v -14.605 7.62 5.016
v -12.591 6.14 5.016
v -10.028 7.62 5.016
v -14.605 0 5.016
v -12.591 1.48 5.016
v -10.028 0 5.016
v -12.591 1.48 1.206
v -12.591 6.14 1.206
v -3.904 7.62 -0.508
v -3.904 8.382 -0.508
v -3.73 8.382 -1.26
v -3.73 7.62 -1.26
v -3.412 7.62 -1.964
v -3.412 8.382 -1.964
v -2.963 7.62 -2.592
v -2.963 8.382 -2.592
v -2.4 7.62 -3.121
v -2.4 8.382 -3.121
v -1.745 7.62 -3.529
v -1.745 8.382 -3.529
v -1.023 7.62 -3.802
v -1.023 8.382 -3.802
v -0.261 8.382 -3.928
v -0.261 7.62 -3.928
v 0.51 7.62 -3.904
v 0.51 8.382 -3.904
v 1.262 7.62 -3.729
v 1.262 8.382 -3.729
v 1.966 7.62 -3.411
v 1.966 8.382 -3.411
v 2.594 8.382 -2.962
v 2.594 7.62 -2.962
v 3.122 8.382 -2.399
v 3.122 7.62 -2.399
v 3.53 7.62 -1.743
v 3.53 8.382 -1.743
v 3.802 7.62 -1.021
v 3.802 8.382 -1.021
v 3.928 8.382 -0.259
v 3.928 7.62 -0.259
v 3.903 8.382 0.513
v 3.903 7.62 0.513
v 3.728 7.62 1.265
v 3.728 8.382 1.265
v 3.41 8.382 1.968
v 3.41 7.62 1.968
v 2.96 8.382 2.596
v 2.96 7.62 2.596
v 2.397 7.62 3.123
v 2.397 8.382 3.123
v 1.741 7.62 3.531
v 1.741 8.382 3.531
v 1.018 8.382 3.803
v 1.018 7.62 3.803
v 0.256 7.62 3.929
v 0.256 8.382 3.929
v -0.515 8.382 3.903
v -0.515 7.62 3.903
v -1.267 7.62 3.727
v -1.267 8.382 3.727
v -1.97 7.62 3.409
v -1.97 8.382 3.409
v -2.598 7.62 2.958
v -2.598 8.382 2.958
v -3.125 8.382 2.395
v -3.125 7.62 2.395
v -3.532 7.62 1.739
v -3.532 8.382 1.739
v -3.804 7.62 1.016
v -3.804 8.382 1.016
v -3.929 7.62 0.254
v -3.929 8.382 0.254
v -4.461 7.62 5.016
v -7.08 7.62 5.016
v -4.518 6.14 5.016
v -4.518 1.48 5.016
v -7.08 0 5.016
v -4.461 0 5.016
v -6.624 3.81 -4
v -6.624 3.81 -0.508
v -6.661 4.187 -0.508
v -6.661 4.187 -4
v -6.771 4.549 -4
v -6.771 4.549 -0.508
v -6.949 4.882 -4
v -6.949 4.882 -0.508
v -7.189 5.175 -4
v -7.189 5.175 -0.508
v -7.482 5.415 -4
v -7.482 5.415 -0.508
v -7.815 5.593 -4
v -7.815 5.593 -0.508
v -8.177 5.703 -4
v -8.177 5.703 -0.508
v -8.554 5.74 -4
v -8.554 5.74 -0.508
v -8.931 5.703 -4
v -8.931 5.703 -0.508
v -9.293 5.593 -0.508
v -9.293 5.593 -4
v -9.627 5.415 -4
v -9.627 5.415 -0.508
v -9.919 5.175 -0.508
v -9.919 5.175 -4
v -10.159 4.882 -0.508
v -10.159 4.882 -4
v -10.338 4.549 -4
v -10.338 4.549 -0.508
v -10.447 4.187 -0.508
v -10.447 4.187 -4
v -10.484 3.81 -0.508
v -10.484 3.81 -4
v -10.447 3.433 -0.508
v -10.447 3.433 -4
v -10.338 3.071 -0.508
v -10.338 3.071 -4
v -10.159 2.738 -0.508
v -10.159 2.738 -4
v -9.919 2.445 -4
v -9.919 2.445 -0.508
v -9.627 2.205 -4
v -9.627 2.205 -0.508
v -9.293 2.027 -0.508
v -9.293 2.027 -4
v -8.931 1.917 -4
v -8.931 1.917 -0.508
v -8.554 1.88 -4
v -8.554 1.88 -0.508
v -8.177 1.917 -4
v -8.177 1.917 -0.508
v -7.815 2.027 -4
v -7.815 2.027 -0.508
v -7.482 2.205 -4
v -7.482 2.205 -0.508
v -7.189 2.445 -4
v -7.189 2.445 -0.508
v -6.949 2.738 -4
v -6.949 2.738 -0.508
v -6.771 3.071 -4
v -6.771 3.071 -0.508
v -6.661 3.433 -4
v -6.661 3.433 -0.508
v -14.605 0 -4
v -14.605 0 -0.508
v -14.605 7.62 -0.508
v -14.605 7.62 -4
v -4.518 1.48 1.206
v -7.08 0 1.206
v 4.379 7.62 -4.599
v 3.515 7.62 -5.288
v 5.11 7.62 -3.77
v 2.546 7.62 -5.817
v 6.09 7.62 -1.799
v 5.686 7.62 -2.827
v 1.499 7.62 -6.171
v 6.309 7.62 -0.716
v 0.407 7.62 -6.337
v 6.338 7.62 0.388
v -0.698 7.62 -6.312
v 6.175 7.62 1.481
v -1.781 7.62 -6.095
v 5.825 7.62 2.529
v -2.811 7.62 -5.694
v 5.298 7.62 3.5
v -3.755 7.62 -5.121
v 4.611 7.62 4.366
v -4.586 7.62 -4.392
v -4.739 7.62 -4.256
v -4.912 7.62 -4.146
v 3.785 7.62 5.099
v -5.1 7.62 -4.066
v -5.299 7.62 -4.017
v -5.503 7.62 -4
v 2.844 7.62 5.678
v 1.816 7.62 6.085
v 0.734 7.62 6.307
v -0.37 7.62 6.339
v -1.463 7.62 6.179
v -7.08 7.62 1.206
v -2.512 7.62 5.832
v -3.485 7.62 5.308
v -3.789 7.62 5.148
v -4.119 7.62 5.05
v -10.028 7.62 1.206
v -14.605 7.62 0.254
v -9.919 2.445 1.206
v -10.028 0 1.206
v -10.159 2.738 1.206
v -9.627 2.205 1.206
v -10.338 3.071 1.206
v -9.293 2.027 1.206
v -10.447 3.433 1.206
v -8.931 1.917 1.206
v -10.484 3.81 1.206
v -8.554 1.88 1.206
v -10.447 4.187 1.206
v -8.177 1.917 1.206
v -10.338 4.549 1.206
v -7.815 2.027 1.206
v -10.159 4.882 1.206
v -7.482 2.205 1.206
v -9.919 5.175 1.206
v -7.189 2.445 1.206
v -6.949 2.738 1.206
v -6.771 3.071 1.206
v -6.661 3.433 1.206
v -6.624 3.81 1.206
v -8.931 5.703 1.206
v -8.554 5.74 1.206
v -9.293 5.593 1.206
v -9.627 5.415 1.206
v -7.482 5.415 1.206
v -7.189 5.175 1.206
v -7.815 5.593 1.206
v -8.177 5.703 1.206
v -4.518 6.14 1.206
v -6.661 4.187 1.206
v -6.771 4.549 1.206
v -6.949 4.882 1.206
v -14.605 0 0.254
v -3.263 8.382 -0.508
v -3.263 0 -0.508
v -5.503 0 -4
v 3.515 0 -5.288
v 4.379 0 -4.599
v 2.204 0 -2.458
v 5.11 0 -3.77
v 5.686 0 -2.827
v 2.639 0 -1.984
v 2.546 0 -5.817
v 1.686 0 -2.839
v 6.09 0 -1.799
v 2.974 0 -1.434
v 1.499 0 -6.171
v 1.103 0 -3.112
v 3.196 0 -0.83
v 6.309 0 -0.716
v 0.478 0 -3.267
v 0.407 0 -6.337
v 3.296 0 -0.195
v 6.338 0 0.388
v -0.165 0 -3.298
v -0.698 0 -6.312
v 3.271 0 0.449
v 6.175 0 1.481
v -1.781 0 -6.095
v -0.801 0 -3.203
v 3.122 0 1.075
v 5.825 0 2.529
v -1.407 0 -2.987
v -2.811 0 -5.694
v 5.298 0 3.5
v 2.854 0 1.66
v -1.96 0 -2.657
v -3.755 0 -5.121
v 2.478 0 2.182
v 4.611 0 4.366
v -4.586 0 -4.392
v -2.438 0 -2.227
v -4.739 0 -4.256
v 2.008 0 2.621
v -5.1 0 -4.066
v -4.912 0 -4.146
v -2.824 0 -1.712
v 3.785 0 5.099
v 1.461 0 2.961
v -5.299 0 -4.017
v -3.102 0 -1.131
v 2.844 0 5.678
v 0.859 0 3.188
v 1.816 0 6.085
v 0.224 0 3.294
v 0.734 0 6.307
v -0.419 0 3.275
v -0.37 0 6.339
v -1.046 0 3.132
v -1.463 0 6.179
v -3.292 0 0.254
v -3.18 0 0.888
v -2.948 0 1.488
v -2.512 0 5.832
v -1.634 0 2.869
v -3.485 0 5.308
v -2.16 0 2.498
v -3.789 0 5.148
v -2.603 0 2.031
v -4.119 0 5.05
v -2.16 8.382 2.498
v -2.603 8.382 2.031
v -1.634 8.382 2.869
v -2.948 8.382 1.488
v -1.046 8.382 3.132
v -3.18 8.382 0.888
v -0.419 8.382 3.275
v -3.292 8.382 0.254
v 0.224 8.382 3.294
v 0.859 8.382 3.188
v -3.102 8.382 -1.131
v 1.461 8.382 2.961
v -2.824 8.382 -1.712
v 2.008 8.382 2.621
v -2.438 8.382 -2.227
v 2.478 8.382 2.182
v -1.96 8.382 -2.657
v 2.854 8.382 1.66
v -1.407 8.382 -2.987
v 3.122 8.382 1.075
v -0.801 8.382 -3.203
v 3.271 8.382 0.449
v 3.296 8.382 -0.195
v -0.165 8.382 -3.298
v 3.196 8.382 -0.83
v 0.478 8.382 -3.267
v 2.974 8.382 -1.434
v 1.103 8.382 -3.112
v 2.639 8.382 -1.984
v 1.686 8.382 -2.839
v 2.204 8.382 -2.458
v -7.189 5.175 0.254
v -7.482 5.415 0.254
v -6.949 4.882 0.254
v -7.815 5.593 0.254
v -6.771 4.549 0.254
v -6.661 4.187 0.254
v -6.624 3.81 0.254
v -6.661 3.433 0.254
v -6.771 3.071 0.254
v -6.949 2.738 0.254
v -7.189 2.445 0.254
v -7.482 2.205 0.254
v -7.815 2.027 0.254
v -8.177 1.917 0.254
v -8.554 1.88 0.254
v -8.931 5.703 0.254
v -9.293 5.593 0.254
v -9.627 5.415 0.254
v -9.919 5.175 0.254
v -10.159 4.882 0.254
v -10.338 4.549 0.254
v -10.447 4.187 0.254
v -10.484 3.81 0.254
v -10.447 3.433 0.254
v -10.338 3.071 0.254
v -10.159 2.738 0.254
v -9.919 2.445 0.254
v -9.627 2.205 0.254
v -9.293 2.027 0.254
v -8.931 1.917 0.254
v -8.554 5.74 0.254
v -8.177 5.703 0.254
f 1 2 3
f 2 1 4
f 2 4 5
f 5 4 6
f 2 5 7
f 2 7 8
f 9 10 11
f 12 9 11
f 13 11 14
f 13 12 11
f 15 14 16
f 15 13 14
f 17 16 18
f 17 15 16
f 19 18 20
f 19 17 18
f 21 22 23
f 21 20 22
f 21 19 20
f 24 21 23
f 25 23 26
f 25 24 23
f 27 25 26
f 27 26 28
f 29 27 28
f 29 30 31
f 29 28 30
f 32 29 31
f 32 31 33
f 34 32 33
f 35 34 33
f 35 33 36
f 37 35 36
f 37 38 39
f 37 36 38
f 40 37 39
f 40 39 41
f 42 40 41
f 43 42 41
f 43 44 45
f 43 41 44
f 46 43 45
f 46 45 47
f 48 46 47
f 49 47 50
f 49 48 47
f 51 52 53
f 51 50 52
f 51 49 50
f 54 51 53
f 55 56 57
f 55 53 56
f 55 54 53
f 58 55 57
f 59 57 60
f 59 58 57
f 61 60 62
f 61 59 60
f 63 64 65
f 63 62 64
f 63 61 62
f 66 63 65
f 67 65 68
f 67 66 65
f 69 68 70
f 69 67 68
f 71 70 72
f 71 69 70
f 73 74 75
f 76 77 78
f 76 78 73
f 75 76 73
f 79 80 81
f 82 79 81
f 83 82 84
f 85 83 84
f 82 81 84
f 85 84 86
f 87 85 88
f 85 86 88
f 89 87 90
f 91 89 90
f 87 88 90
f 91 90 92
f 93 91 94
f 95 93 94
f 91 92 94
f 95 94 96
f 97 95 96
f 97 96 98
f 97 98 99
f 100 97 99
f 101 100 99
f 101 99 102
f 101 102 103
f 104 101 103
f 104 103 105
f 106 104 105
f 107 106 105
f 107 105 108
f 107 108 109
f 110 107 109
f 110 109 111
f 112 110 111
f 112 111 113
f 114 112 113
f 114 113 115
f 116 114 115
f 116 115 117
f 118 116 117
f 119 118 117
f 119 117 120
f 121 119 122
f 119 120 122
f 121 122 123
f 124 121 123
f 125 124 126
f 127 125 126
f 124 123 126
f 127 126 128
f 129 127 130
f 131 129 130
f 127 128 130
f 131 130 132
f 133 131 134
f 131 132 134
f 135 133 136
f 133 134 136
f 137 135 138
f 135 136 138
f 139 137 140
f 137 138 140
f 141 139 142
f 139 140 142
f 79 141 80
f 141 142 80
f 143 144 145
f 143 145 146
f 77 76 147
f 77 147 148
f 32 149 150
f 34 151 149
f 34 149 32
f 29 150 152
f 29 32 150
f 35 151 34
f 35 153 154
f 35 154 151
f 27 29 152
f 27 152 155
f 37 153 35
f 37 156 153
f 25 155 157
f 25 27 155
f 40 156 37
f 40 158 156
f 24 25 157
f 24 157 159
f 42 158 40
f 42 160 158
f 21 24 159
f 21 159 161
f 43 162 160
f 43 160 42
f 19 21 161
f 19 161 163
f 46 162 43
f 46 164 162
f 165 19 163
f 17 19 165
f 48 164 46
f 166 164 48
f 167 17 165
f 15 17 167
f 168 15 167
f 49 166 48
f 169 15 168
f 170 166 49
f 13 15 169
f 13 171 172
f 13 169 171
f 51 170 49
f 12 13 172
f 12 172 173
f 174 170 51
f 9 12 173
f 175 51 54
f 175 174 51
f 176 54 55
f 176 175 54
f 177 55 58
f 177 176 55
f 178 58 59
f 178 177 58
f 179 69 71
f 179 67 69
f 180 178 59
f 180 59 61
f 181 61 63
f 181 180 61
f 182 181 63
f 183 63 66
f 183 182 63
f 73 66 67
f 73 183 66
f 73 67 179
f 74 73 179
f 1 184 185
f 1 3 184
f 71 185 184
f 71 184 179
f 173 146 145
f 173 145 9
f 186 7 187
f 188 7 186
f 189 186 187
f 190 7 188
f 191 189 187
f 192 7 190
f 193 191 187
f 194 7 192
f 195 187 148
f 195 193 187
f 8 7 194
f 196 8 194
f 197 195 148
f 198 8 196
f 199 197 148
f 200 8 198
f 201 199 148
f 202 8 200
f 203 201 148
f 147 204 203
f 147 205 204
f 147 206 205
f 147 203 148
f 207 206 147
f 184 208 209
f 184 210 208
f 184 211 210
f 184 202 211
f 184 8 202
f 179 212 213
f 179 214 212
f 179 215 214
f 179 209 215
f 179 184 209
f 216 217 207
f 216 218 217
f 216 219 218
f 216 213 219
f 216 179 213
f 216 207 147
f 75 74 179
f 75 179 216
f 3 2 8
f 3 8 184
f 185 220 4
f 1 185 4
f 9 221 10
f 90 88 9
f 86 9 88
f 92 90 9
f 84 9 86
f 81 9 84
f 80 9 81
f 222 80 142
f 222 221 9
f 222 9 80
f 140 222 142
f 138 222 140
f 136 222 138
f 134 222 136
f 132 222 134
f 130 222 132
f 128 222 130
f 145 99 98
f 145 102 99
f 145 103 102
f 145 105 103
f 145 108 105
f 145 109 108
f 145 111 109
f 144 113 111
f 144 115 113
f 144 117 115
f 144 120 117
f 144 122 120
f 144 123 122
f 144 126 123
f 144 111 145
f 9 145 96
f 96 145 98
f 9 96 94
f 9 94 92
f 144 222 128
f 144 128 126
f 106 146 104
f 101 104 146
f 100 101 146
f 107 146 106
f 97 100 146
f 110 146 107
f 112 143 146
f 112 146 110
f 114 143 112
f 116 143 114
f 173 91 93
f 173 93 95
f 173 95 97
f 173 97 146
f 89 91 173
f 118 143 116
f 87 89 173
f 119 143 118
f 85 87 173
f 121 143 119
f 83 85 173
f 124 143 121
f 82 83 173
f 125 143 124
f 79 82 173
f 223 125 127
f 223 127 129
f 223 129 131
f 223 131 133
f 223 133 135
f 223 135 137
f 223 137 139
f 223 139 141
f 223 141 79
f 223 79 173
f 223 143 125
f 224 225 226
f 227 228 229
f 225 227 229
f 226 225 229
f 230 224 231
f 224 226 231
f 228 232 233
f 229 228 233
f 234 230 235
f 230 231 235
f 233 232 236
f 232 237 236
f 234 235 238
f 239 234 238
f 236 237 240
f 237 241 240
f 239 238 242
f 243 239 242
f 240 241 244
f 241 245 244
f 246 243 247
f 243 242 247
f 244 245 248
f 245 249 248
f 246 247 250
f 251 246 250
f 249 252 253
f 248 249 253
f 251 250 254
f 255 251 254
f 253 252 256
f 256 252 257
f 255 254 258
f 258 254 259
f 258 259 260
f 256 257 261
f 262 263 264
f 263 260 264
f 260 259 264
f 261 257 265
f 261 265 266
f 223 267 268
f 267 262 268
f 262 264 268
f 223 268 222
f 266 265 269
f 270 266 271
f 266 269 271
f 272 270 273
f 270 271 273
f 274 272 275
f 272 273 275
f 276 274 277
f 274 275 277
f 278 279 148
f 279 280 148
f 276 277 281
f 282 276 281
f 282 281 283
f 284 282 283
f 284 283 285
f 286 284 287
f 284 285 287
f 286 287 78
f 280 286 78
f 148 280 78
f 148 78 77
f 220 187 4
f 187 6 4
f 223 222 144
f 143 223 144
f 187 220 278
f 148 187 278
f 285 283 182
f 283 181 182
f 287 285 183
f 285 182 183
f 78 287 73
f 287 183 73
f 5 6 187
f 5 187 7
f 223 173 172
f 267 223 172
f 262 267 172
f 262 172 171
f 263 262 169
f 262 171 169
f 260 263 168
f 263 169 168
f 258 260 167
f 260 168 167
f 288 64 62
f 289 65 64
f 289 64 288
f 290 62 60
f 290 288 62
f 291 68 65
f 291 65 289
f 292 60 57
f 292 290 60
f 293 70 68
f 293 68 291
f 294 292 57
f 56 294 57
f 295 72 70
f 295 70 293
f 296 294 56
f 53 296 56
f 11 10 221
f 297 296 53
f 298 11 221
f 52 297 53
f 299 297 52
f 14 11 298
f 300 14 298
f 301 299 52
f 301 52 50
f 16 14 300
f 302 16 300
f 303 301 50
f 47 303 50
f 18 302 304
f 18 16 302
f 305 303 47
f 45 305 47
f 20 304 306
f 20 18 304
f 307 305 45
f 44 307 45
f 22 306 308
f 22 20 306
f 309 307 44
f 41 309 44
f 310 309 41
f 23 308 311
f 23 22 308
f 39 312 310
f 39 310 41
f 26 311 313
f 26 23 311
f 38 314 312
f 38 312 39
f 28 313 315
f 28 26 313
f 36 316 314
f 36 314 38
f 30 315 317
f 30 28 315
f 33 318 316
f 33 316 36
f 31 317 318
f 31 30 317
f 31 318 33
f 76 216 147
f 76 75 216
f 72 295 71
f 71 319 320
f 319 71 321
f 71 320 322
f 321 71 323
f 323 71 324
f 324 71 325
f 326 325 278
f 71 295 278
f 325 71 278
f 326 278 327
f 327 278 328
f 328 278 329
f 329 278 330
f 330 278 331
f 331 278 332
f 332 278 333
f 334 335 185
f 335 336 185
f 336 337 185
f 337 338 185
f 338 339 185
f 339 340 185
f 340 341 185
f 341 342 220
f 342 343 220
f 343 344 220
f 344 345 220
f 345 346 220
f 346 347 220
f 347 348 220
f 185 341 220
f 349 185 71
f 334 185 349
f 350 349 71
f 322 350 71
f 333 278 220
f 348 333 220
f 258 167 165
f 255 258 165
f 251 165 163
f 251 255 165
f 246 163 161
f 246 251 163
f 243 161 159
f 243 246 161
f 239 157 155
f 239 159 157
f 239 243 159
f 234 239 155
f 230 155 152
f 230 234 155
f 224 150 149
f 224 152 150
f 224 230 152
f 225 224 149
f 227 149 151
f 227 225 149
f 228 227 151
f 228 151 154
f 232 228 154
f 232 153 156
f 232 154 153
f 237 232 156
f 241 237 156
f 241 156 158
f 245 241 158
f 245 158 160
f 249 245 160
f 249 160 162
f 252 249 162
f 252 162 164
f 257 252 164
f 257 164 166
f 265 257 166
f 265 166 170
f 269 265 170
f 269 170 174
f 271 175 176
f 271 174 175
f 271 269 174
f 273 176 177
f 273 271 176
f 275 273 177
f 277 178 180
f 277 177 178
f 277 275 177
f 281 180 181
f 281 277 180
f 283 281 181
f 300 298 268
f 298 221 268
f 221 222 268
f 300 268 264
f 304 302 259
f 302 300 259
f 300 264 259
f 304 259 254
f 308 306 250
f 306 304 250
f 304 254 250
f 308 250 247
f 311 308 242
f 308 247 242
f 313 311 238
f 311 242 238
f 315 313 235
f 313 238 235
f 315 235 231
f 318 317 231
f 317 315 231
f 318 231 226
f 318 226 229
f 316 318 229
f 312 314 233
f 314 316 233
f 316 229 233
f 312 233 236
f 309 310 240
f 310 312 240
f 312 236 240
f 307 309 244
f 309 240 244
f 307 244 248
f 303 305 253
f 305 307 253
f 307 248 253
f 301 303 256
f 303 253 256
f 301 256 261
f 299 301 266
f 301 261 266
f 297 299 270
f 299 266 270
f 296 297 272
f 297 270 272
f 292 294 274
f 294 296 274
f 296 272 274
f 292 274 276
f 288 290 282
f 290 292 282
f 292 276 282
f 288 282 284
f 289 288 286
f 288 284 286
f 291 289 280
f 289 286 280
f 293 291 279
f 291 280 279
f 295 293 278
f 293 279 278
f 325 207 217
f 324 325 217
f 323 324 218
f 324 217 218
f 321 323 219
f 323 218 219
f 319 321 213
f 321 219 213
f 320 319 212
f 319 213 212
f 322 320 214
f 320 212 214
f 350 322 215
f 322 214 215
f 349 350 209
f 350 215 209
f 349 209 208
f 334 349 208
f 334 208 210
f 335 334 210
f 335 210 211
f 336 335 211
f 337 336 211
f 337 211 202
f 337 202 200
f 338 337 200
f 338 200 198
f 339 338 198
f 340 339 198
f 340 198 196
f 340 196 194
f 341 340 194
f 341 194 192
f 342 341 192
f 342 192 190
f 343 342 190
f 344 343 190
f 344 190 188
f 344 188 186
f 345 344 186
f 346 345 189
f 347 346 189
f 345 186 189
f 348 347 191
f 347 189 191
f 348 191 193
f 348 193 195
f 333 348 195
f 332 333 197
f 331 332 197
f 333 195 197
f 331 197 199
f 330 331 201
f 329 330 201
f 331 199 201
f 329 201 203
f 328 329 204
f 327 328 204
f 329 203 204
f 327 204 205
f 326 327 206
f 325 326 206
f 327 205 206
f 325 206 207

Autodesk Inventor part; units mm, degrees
ref_plane "YZ Plane" through (0, 0, 0) normal (1, 0, 0) x (0, 1, 0)
ref_plane "XZ Plane" through (0, 0, 0) normal (0, 1, 0) x (-1, 0, 0)
ref_plane "XY Plane" through (0, 0, 0) normal (0, 0, 1) x (1, 0, 0)
sketch "Sketch1" plane through (0, 0, 0) normal (0, 1, 0) x (-1, 0, 0)
  arc A0 (3.8932, 5.0165) -> (4.9314, -4.0005) centre (0, 0) ccw
  arc A1 (3.2922, 0.254) -> (3.2627, -0.508) centre (0, 0) ccw
  line L0 (14.605, -0.508) -> (14.605, -4.0005)
  line L1 (14.605, -4.0005) -> (4.9314, -4.0005)
  line L2 (14.605, 0.254) -> (14.605, 5.0165)
  line L3 (14.605, 5.0165) -> (3.8932, 5.0165)
  line L4 (3.2627, -0.508) -> (14.605, -0.508)
  line L5 (3.2922, 0.254) -> (14.605, 0.254)
  dimension "d0" = 12.7
  dimension "d1" = 6.604
  dimension "d8" = 0.254
  dimension "d9" = 0.508
  dimension "d10" = 4.7625
  dimension "d11" = 3.4925
  dimension "d25" = 14.605
  dimension "d26" = 14.605
extrude "PartShape" add sketch "Sketch1" along normal blind 7.62
sketch "Sketch2" plane through (0, 7.62, 0) normal (0, 1, 0) x (1, 0, 0)
  arc A0 (-3.9288, -0.254) -> (-3.9041, 0.508) centre (0, 0) ccw
  arc A1 (-3.2922, -0.254) -> (-3.2627, 0.508) centre (0, 0) ccw
  line L0 (-3.2922, -0.254) -> (-14.605, -0.254) projected
  line L1 (-3.9288, -0.254) -> (-3.2922, -0.254)
  line L2 (-14.605, 0.508) -> (-3.2627, 0.508) projected
  arc A2 (-3.2922, -0.254) -> (-3.2627, 0.508) centre (0, 0) ccw projected
  line L3 (-14.605, 0.508) -> (-3.2627, 0.508) projected
  line L4 (-3.9041, 0.508) -> (-3.2627, 0.508)
  dimension "d14" = 7.874
extrude "RaceStandoff" add sketch "Sketch2" along normal blind 0.762
sketch "Sketch3" plane through (-14.605, 0, 5.0165) normal (0, 0, 1) x (1, 0, 0)
  line L0 (0, 0) -> (0, 7.62) construction
  line L1 (0, 3.81) -> (11.9818, 3.81) construction
  line L2 (10.7118, 0) -> (10.7118, 7.62) construction
  circle A0 centre (6.0509, 3.81) radius 4.6609 construction
  line L3 (6.0509, -0.8509) -> (2.0144, 1.4796)
  line L4 (2.0144, 1.4796) -> (2.0144, 6.1404)
  line L5 (2.0144, 6.1404) -> (6.0509, 8.4709)
  line L6 (6.0509, 8.4709) -> (10.0873, 6.1405)
  line L7 (10.0873, 6.1405) -> (10.0873, 1.4796)
  line L8 (10.0873, 1.4796) -> (6.0509, -0.8509)
  point P0 (14.605, 0)
  dimension "d18" = 9.3218
  dimension "d19" = 4.6609
extrude "NutWell" cut sketch "Sketch3" against normal blind 3.81
sketch "Sketch4" plane through (-14.605, 0, 1.2065) normal (0, 0, 1) x (1, 0, 0)
  line L0 (10.7118, 0) -> (10.7118, 7.62) construction
  line L1 (10.6762, 7.62) -> (0, 7.62) construction
  circle A0 centre (6.0509, 3.81) radius 1.9304
  line L2 (2.0144, 6.1404) -> (4.5771, 7.62) construction
  line L3 (10.0873, 6.1405) -> (10.0873, 1.4796) construction
  line L4 (2.0144, 6.1404) -> (10.0873, 1.4796) construction
  line L5 (10.0873, 1.4796) -> (10.0873, 6.1404) construction
  line L6 (4.5771, 0) -> (2.0144, 1.4796) construction
  line L7 (10.0873, 6.1404) -> (2.0144, 1.4796) construction
  point P0 (14.605, 0)
  point P1 (11.9818, 3.81)
  point P2 (12.5191, 7.62)
  dimension "d22" = 3.8608
extrude "ScrewHole" cut sketch "Sketch4" against normal through all
fillet "Fillet1" radius 1.27 1 edges at (-4.9314, 3.81, -4.0005)
fillet "Fillet2" radius 1.778 1 edges at (-3.8932, 3.81, 5.0165)
properties part number "Clamping Collar 1_4"
